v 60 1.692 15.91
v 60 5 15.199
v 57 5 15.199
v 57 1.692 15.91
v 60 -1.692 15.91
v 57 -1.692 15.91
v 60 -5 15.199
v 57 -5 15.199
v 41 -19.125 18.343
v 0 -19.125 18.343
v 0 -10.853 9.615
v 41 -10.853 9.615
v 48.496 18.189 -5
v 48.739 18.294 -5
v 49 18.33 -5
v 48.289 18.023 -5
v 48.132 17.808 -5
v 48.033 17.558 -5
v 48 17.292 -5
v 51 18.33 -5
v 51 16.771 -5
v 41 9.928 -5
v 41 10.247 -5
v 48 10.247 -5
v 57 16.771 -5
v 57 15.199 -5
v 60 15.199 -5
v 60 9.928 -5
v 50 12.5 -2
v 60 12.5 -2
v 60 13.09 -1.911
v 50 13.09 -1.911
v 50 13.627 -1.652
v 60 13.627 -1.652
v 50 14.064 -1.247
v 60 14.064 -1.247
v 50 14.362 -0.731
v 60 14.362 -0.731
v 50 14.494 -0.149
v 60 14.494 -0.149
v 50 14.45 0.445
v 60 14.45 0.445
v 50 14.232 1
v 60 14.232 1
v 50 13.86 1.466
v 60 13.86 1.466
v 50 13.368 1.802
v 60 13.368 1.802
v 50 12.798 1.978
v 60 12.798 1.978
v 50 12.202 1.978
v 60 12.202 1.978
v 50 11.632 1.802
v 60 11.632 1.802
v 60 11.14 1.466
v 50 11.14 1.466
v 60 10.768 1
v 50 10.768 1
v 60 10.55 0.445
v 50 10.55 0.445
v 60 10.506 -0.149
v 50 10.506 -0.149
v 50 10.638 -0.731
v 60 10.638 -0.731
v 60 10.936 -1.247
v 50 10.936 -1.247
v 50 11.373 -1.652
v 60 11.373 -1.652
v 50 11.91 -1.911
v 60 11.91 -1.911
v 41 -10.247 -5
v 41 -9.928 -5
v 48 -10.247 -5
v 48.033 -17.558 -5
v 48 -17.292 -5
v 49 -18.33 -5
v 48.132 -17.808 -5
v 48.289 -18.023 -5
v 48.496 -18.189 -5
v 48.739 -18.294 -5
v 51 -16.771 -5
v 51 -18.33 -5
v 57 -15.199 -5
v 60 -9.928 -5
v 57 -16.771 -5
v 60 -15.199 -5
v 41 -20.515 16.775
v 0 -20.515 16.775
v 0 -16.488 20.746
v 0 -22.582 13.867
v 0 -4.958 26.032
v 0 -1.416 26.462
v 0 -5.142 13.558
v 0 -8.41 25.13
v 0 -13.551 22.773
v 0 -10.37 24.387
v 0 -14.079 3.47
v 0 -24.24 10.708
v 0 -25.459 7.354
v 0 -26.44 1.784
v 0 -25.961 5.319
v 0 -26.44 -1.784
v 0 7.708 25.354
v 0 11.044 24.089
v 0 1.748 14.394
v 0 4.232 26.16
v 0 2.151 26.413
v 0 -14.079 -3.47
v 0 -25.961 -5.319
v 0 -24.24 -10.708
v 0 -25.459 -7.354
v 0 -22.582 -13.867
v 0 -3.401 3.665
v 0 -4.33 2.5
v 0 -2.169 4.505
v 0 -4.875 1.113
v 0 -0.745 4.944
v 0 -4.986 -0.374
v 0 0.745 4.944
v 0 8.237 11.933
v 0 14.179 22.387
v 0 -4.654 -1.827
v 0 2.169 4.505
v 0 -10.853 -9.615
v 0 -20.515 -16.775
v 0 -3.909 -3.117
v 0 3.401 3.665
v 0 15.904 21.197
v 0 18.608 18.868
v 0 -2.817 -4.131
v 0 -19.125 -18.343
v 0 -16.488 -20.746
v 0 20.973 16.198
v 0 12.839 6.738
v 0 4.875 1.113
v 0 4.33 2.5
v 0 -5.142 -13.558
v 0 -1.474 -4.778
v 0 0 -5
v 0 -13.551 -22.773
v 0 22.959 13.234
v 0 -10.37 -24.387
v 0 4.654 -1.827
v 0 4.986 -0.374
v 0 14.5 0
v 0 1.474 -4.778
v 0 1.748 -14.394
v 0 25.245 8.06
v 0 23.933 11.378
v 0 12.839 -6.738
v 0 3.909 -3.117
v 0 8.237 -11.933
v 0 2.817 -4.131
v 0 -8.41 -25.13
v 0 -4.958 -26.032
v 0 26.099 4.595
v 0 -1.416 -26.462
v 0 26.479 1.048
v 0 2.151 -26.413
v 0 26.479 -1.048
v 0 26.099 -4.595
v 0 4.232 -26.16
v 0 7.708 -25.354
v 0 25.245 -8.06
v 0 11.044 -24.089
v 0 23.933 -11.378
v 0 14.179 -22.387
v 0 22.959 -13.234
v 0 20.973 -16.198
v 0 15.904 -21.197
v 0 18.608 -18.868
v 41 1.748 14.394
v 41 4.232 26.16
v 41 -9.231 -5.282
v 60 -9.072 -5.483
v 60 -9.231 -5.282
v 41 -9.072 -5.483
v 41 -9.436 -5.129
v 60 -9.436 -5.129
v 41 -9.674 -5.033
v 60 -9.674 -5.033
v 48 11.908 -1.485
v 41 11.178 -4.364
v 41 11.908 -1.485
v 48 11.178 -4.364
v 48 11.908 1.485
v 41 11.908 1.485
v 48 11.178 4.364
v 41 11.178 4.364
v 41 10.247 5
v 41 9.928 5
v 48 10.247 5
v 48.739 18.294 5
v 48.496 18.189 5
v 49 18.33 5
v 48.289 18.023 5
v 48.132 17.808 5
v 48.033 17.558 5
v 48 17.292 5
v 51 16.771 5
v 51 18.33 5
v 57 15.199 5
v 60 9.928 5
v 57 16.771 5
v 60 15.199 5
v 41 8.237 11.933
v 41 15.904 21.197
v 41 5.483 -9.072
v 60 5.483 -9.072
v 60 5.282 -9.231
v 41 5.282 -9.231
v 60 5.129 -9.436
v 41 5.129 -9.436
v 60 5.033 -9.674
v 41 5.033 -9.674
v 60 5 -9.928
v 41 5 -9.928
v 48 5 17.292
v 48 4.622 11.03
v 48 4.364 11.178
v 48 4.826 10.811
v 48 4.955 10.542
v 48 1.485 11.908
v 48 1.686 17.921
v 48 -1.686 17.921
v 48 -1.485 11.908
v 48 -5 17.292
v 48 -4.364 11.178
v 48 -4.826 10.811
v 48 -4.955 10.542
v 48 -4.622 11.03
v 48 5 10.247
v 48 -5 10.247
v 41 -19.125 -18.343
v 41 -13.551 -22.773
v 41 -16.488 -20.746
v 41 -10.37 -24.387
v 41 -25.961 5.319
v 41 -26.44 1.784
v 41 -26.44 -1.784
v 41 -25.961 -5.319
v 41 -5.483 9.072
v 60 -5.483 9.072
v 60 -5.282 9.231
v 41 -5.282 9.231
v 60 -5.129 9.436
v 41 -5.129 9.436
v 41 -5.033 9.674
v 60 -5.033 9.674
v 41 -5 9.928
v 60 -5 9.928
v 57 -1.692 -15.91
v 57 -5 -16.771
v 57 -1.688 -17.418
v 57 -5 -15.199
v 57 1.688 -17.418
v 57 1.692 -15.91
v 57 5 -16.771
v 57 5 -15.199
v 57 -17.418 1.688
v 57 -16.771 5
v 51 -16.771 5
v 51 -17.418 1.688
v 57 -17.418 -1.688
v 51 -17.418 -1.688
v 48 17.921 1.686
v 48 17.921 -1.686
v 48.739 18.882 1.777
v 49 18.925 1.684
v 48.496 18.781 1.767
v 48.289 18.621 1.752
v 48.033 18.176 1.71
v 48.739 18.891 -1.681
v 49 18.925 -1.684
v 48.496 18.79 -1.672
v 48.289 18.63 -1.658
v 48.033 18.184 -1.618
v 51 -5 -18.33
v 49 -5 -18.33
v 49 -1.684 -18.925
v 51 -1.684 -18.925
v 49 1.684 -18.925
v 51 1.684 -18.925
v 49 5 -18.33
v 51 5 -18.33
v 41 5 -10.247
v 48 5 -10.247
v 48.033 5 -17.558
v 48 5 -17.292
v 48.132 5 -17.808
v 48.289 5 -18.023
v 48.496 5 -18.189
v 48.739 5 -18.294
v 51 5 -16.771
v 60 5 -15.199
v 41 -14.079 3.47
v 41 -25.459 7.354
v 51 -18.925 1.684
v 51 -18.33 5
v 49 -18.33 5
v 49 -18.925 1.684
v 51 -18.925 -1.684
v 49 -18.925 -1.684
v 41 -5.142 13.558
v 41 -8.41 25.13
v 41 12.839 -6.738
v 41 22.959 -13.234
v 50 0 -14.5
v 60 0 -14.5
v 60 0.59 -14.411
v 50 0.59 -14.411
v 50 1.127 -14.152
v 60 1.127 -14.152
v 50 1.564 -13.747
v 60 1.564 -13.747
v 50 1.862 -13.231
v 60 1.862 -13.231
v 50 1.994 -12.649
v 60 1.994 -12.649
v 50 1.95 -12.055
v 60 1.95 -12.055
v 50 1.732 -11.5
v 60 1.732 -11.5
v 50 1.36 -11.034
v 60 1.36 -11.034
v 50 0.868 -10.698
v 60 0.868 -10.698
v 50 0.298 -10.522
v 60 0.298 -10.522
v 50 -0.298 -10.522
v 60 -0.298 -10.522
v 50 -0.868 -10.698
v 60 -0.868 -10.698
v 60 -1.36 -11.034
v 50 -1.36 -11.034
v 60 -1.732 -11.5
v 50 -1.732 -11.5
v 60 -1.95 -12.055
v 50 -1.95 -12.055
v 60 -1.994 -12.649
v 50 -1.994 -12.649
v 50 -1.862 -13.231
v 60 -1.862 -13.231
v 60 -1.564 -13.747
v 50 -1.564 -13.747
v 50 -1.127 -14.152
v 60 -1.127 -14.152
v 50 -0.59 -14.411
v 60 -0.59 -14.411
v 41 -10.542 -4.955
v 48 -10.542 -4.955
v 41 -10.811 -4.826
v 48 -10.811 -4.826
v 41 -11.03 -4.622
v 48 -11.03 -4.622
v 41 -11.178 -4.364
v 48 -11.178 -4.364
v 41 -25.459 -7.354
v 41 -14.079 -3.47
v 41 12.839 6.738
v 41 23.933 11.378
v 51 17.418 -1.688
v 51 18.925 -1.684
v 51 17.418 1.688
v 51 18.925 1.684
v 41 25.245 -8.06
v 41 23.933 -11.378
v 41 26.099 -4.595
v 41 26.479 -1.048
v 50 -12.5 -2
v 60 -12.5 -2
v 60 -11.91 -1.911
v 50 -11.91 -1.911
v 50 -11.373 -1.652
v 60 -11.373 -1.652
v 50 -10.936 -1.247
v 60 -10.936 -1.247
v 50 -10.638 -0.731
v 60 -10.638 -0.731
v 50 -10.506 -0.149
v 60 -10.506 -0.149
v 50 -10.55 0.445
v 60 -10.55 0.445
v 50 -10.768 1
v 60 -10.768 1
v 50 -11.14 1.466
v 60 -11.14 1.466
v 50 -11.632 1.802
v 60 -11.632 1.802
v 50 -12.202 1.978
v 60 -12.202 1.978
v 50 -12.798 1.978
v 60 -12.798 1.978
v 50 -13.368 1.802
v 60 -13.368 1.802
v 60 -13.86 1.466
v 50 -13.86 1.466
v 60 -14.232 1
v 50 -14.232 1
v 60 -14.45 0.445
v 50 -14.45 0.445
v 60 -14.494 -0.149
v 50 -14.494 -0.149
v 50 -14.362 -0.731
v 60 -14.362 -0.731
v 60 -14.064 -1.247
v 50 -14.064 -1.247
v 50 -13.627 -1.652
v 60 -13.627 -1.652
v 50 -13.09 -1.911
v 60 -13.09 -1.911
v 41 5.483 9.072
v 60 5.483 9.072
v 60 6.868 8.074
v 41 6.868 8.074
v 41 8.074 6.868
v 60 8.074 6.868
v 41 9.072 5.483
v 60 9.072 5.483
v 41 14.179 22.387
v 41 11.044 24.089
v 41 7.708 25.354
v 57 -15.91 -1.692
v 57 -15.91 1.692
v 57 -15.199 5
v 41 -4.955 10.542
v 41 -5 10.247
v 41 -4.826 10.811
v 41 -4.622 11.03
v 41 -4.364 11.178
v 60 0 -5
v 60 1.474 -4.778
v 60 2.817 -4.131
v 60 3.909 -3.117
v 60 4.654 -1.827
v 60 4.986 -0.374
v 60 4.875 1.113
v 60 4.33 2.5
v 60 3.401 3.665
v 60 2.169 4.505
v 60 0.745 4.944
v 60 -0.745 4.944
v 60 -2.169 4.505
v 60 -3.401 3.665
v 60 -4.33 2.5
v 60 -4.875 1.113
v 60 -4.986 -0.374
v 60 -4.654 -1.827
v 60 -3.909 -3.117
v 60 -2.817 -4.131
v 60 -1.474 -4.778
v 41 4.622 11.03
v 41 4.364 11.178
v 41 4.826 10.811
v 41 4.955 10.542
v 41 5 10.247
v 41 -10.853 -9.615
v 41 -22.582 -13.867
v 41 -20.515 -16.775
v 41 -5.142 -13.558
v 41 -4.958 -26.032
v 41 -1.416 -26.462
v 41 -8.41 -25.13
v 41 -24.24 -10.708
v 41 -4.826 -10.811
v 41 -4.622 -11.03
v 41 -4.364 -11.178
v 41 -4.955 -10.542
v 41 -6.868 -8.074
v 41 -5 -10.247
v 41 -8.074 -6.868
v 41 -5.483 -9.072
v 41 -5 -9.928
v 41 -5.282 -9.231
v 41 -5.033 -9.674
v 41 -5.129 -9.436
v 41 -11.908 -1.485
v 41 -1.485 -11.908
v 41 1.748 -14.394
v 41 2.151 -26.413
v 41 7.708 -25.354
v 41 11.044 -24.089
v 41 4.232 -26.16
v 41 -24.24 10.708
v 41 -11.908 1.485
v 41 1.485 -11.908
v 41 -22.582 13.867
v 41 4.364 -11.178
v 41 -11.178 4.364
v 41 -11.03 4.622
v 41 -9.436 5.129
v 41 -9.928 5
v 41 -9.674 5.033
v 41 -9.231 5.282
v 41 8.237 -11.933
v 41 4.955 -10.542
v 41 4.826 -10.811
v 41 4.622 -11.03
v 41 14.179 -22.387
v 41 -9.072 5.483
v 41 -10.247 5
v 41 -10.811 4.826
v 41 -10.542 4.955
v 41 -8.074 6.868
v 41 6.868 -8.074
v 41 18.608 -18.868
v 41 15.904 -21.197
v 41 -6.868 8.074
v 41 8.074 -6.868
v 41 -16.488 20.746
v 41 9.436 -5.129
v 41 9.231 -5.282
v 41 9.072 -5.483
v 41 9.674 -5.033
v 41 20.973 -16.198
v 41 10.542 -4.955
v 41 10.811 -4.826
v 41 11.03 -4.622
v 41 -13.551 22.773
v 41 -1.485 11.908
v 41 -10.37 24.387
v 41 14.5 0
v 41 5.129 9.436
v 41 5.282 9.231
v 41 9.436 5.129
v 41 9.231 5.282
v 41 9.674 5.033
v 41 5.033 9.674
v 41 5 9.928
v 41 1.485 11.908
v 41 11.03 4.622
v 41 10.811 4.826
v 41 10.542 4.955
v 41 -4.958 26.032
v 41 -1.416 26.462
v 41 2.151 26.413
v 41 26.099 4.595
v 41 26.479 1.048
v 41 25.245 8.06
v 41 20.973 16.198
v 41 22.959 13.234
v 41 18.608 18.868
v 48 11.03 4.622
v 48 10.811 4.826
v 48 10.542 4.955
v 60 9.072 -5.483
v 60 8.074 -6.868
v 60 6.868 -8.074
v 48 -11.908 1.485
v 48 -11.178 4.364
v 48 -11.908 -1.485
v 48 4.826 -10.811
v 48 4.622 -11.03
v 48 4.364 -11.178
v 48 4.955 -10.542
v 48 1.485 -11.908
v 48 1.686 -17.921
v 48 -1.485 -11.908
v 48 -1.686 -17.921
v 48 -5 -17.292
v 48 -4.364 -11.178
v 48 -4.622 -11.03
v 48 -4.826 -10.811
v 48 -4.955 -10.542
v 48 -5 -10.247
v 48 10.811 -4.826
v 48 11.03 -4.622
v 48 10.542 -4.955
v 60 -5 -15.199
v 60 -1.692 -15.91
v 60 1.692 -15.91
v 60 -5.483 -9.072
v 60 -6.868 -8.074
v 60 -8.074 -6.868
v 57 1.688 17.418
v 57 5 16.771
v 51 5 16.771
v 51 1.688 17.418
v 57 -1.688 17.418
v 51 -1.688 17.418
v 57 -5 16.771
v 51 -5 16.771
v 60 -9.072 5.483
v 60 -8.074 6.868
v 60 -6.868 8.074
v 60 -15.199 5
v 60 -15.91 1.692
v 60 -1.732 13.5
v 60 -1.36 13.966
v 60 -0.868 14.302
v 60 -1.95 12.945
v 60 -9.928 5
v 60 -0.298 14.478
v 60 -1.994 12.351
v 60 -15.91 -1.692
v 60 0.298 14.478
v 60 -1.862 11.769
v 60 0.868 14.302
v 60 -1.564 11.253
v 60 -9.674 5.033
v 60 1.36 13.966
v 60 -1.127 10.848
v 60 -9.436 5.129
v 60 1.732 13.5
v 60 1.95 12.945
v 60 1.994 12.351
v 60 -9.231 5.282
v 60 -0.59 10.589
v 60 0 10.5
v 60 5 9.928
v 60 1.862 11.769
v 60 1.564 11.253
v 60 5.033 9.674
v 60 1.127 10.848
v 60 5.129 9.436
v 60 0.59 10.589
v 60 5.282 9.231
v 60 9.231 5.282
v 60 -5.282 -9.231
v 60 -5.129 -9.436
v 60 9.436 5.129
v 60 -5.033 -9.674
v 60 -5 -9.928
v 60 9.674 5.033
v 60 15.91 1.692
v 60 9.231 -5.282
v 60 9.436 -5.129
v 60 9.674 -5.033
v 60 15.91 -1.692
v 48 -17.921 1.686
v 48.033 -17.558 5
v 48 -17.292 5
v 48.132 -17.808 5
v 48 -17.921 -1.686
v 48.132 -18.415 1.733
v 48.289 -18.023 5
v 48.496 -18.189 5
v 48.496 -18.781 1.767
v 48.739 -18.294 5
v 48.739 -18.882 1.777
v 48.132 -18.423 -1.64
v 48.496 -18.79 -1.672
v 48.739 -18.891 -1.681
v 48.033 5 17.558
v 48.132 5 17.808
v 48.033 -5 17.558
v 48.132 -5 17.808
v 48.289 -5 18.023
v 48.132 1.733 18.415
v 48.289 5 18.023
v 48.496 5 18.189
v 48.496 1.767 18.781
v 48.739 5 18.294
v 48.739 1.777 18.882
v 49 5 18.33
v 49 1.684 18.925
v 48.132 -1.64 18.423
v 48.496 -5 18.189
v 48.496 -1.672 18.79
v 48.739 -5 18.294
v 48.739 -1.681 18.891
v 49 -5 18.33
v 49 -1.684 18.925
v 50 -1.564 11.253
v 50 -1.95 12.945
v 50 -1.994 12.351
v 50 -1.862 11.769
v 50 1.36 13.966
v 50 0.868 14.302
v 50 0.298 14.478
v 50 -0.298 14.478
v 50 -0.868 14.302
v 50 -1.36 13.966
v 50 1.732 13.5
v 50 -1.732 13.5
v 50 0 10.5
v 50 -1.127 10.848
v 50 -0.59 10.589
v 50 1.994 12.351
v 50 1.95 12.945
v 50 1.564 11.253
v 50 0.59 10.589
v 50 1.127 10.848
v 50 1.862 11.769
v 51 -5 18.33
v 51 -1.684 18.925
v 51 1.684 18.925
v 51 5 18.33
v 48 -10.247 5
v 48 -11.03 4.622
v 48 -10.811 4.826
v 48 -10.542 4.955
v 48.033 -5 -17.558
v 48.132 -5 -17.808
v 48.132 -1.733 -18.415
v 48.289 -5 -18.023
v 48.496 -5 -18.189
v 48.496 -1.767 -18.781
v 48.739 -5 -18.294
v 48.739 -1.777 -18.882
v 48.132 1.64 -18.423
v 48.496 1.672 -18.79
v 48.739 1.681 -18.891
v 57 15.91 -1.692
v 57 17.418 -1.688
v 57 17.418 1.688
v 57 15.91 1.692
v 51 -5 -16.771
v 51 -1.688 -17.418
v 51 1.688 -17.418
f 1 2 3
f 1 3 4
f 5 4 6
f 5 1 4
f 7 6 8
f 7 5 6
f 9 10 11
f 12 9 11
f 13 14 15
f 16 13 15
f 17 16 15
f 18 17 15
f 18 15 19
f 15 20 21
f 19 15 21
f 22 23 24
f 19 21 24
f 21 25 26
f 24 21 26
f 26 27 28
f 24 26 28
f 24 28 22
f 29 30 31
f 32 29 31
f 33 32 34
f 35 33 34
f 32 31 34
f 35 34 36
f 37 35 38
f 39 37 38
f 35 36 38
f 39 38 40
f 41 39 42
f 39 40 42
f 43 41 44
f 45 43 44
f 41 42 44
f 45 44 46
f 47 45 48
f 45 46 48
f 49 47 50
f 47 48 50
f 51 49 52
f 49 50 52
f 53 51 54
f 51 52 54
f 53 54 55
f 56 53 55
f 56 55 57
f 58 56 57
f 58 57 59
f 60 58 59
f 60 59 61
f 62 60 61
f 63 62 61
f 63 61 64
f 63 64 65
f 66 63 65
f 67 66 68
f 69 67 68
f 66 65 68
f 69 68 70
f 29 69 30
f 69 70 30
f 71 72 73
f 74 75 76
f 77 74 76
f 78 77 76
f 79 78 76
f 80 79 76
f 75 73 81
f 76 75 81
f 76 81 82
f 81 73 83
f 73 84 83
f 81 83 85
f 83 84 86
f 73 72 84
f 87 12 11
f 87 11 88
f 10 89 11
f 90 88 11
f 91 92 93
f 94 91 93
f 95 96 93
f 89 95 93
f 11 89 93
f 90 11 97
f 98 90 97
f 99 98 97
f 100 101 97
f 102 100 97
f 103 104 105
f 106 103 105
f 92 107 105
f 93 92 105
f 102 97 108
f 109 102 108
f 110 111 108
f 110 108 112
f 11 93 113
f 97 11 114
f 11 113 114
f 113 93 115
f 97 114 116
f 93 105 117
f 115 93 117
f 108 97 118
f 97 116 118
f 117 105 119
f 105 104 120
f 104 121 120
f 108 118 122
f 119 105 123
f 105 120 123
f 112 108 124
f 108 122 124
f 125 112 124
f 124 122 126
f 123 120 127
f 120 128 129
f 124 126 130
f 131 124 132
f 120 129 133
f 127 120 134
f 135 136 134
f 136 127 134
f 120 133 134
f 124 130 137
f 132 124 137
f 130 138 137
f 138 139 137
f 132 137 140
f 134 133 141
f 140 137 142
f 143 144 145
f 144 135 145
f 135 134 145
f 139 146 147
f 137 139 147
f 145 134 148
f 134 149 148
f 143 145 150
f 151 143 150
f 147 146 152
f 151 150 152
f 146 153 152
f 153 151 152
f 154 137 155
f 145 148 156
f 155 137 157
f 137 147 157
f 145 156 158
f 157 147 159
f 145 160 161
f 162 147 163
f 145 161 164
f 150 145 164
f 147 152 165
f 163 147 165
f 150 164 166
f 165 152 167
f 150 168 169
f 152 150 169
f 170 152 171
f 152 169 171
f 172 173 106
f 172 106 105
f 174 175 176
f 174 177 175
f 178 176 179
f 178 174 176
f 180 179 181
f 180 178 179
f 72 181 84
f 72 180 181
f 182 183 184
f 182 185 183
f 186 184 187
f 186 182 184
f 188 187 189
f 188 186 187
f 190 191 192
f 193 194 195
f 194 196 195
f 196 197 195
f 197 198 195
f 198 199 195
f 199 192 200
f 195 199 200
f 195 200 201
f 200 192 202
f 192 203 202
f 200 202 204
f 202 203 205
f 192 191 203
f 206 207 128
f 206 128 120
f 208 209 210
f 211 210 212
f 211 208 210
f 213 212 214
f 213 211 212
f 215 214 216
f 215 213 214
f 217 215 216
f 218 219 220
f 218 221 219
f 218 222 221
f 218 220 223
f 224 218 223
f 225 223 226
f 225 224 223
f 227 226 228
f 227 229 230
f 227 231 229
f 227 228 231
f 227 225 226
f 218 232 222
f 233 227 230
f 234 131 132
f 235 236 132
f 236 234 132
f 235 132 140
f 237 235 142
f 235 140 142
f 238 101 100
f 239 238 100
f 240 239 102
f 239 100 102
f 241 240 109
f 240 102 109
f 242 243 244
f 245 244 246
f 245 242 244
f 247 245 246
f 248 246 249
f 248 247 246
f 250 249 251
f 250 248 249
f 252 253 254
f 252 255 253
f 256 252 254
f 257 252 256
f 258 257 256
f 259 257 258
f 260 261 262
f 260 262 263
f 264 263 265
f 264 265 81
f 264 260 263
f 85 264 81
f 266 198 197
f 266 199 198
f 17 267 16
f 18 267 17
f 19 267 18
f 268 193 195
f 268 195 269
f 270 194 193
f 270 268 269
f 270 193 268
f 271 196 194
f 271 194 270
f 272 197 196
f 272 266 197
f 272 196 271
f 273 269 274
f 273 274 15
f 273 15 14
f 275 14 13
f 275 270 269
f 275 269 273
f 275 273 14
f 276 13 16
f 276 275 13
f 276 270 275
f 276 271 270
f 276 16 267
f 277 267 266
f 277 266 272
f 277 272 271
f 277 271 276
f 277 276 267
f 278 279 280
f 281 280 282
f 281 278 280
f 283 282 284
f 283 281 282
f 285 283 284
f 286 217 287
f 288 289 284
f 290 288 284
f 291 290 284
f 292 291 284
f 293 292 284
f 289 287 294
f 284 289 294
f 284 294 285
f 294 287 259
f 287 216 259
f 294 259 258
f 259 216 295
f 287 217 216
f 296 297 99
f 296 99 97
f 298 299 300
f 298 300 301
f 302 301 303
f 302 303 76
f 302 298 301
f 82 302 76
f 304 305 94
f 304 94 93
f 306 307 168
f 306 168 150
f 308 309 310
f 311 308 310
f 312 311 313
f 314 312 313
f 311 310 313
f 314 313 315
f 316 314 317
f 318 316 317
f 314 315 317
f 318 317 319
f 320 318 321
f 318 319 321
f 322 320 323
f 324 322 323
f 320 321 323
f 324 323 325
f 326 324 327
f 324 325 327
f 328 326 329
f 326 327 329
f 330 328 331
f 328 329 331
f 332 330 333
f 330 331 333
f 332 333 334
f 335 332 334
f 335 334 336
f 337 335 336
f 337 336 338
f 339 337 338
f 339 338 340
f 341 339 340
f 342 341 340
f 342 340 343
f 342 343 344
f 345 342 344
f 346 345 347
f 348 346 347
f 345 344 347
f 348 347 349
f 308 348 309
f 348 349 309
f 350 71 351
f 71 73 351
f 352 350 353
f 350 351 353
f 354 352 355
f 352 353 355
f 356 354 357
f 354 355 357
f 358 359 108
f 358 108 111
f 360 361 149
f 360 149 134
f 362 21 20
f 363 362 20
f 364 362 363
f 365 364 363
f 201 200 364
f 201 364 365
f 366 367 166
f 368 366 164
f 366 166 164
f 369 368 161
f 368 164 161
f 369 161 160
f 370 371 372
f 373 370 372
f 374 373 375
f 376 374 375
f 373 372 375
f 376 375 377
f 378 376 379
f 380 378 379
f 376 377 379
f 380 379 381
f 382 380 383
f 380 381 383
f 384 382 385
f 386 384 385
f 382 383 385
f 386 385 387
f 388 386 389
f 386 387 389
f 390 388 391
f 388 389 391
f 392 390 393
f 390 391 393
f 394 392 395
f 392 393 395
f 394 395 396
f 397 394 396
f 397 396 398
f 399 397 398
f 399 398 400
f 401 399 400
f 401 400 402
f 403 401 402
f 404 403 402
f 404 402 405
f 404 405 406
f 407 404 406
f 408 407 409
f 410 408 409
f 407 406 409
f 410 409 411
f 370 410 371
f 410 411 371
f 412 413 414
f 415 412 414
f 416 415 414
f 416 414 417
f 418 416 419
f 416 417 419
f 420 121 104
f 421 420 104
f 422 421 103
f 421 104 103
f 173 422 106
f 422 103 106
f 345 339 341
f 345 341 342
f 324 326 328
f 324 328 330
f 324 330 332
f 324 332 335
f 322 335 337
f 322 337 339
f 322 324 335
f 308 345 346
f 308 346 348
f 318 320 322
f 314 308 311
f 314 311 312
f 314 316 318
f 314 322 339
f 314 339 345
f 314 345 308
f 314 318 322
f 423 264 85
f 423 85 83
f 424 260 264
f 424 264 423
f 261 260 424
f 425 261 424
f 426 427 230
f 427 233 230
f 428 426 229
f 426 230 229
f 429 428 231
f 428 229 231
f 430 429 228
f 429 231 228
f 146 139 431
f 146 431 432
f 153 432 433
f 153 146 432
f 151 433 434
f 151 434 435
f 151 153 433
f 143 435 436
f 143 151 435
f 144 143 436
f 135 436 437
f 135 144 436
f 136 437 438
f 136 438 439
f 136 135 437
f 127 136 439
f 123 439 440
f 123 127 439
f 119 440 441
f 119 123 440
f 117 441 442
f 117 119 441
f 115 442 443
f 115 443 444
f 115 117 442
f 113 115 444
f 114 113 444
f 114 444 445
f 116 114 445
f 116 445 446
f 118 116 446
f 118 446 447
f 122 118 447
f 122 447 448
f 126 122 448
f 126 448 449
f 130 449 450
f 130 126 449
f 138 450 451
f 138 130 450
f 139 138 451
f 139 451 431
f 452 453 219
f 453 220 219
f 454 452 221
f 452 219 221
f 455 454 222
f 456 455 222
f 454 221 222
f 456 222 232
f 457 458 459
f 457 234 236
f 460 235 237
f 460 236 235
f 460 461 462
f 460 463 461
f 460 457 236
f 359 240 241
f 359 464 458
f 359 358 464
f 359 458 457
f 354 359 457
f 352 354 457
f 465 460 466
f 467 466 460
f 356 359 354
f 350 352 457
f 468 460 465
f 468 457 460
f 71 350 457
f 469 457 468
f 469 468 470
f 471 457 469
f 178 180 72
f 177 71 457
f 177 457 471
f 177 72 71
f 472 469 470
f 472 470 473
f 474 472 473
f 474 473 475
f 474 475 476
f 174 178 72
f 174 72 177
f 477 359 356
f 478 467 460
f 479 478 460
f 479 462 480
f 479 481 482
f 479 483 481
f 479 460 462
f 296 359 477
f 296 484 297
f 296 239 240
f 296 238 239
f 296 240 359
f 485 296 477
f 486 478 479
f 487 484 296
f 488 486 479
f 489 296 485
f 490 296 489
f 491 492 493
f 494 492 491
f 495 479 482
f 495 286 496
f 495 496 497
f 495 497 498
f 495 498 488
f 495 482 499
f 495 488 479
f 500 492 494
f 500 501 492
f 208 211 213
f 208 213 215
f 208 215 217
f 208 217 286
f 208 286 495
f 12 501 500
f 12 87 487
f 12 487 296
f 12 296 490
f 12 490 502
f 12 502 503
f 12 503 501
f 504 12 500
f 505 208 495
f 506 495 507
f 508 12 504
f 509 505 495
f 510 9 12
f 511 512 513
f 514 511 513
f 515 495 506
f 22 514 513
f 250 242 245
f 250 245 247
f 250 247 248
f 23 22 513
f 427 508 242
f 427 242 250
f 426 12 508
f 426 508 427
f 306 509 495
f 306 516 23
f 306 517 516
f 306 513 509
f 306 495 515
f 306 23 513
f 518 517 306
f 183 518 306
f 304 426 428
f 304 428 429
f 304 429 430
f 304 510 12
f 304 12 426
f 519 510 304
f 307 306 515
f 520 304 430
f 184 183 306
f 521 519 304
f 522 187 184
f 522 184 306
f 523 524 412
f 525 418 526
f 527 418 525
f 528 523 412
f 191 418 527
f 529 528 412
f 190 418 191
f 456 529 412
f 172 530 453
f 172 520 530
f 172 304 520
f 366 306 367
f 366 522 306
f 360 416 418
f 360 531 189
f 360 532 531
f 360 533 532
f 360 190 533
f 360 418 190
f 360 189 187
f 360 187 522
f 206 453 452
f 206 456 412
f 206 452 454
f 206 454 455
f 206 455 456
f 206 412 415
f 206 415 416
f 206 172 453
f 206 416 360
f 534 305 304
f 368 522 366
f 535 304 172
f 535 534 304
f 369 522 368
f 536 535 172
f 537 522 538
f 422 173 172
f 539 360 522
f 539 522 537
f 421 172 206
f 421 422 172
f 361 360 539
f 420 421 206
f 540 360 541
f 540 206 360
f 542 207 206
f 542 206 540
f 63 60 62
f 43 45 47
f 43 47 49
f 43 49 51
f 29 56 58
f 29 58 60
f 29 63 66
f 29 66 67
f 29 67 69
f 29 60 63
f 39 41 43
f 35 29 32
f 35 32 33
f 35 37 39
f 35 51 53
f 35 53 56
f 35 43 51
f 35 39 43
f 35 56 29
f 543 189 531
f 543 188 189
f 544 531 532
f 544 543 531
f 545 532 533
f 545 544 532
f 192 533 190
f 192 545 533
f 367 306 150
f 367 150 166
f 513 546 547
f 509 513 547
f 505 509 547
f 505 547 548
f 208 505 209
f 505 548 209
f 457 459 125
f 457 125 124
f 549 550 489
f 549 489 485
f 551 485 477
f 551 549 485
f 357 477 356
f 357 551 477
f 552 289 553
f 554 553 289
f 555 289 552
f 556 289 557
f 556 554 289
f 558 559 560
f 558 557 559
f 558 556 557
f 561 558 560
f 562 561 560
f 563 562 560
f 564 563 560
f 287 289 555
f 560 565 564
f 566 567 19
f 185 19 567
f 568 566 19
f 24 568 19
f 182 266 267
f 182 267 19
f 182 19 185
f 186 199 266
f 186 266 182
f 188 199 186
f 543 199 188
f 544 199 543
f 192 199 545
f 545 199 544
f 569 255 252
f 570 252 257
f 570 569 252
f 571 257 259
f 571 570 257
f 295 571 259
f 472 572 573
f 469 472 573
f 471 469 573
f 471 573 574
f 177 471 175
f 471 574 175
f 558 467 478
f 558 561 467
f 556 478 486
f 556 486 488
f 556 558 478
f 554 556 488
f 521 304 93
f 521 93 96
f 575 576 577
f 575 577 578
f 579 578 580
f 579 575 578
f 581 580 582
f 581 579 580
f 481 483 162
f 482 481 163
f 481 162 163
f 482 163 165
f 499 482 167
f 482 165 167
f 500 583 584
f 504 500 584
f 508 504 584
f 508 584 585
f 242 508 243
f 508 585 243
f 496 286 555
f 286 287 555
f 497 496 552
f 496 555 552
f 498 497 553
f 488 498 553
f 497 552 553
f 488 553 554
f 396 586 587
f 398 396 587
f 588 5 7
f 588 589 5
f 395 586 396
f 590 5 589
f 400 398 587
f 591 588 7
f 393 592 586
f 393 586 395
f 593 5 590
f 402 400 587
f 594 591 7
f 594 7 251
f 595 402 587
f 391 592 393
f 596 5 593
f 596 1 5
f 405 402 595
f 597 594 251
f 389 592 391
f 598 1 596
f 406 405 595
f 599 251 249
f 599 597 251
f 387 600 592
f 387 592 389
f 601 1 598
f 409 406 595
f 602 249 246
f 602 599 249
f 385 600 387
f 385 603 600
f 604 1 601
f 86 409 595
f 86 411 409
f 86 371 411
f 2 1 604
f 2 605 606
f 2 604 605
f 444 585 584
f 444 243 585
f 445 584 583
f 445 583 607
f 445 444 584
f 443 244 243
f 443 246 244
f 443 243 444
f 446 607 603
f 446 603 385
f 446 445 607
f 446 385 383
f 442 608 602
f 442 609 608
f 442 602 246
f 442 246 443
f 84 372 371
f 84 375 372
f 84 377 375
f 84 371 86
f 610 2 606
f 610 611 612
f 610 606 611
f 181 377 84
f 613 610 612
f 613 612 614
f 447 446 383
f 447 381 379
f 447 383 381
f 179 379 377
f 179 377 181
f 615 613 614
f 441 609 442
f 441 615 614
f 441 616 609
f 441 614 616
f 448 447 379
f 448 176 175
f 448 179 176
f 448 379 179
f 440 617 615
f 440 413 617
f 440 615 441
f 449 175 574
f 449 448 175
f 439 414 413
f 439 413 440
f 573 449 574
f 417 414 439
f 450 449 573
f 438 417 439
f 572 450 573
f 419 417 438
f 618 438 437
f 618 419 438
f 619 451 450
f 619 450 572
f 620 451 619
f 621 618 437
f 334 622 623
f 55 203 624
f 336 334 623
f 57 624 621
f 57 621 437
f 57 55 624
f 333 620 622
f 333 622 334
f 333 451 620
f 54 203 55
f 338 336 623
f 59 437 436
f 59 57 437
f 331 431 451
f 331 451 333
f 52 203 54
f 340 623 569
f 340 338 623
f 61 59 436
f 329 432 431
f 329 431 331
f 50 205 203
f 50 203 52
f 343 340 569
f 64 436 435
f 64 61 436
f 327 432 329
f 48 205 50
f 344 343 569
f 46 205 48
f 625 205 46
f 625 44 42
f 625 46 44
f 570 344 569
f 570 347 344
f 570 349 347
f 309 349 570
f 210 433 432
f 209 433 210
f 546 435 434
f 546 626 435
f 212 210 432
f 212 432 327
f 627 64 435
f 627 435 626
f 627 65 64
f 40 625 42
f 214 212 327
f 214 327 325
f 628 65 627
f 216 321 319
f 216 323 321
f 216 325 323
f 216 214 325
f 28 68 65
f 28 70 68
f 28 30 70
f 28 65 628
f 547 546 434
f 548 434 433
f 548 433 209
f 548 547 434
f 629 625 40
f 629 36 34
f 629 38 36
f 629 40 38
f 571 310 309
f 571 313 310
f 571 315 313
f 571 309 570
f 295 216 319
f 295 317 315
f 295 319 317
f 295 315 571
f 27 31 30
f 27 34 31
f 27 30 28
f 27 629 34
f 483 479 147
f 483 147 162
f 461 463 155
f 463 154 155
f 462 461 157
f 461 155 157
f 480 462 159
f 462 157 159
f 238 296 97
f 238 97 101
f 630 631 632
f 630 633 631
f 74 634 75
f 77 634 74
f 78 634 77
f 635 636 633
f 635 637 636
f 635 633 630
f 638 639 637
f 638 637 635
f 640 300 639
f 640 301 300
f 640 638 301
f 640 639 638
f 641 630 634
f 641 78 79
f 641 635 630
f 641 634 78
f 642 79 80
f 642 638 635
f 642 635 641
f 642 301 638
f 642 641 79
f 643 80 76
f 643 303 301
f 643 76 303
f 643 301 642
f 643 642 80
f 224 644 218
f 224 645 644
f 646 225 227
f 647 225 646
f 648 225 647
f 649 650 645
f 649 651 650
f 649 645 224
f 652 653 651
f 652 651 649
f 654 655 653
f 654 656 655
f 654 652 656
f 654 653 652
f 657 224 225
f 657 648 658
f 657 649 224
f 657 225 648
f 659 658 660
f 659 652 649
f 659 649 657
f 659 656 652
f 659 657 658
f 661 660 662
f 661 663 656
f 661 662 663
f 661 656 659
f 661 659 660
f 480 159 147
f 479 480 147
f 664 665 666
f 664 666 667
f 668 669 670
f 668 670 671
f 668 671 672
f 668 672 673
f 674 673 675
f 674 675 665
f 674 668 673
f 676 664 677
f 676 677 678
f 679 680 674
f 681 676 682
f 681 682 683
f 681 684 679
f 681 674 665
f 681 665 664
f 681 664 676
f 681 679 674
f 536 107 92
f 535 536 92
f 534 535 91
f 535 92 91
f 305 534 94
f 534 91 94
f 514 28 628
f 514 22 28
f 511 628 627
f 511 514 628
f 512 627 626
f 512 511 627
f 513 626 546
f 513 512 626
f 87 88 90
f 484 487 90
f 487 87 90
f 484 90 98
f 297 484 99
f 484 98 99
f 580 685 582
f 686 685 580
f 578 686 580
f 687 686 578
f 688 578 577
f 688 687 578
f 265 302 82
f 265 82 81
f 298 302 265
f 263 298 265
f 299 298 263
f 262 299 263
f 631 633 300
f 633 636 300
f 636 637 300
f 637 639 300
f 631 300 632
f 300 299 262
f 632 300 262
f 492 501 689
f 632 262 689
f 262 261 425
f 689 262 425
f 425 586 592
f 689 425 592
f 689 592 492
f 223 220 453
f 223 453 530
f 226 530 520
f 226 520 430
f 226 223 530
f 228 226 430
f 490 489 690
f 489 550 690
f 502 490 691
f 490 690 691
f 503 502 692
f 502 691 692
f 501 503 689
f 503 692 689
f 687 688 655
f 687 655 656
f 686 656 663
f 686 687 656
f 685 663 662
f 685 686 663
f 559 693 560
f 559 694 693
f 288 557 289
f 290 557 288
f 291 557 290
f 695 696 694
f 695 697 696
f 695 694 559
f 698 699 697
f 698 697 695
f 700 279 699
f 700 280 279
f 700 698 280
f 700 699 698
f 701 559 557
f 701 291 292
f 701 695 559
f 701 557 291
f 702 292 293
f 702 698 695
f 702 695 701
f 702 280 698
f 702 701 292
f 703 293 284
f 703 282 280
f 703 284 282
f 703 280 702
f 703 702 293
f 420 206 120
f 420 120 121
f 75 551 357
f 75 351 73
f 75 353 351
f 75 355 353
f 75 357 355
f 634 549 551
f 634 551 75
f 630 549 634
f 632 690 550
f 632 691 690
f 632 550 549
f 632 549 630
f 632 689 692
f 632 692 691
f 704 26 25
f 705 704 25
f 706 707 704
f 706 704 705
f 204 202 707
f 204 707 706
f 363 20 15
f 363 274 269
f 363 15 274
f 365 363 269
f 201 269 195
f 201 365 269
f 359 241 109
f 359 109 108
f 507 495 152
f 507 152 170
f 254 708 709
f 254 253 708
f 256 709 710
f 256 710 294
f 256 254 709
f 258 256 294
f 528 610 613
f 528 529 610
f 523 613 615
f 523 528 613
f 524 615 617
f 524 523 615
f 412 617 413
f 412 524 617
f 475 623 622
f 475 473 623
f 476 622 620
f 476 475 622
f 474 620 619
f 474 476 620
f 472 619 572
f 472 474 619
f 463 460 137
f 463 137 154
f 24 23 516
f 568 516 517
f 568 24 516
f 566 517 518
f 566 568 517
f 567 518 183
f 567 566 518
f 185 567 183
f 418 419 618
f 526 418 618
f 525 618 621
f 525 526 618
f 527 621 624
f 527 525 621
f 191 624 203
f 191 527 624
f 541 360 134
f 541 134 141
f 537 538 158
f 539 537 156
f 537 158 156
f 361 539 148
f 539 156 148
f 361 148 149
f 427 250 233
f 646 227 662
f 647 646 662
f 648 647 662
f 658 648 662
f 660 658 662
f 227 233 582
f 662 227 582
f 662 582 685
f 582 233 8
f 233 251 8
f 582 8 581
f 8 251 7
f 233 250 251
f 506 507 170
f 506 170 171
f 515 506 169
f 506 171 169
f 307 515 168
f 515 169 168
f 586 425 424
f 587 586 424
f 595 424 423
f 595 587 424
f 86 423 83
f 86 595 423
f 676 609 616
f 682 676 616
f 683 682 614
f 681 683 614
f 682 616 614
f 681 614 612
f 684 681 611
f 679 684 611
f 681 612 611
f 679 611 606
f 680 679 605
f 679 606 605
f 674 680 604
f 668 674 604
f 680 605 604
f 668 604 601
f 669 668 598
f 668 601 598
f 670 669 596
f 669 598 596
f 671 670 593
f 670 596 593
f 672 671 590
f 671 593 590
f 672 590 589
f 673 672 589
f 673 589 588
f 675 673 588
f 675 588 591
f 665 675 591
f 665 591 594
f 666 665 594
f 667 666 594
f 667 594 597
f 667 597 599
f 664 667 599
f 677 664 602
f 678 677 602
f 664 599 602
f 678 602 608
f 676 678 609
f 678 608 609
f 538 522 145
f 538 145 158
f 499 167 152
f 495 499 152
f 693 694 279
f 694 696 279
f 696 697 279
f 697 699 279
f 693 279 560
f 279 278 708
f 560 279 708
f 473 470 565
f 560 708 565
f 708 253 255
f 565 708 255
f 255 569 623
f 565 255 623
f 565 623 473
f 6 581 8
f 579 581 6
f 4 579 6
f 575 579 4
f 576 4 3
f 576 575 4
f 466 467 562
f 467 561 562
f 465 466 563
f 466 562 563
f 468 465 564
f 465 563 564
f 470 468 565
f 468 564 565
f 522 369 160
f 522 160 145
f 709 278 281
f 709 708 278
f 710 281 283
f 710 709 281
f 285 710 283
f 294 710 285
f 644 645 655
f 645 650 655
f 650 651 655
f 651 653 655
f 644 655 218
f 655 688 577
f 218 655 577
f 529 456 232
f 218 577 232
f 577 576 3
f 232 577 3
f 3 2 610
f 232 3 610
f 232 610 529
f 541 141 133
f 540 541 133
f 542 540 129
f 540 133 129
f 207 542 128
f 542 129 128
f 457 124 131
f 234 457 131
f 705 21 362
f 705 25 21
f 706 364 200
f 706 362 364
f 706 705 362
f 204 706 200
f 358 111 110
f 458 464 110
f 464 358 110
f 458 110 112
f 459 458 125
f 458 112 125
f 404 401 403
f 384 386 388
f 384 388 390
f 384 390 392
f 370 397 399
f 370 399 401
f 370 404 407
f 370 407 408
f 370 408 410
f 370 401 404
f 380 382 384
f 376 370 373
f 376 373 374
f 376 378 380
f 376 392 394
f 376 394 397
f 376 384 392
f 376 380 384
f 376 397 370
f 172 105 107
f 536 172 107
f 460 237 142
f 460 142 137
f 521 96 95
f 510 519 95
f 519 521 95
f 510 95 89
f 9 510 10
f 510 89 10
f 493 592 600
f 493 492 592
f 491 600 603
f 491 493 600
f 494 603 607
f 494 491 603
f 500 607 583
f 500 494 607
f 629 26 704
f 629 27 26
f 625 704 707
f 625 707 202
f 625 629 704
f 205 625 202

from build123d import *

# Parameters (mm, degrees)
SKETCH1_R      = 26.5
SKETCH1_R_2    = 5
EXTRUDE1_DEPTH = 60
SKETCH3_R      = 2
EXTRUDE2_DEPTH = 10
EXTRUDE3_START = -41
EXTRUDE3_DEPTH = 41
EXTRUDE4_DEPTH = 19
FILLET1_R      = 1


with BuildPart() as part:
    # Sketch1 → Extrude1 (new body)
    with BuildSketch(Plane(origin=(0, 0, 0), x_dir=(0, 0, -1), z_dir=(1, 0, 0))):
        Circle(SKETCH1_R)
        Circle(SKETCH1_R_2, mode=Mode.SUBTRACT)
    extrude(amount=EXTRUDE1_DEPTH)

    # Sketch2 → Cut-Revolve1 (revolve, cut)
    with BuildSketch(Plane.XY):
        Polygon((60, 16), (60, 26.5), (41, 26.5), (41, 12), (48, 12), (48, 19), (51, 19), (51, 17.5), (57, 17.5), (57, 16), align=None)
    revolve(axis=Axis((0, 0, 0), (1, 0, 0)), mode=Mode.SUBTRACT)

    # Sketch3 → Extrude2 (cut)
    with BuildSketch(Plane(origin=(60, 0, 0), x_dir=(0, 0, -1), z_dir=(1, 0, 0))):
        with Locations((0, 12.5)):
            Circle(SKETCH3_R)
        with Locations((12.5, 0)):
            Circle(SKETCH3_R)
        with Locations((0, -12.5)):
            Circle(SKETCH3_R)
        with Locations((-12.5, 0)):
            Circle(SKETCH3_R)
    extrude(amount=-EXTRUDE2_DEPTH, mode=Mode.SUBTRACT)

    # Sketch4 → Extrude3 (cut)
    with BuildSketch(Plane.ZY.offset(EXTRUDE3_START)):
        with BuildLine():
            Line((0, 14.5), (1.048050077, 26.479267192))
            ThreePointArc((1.048050077, 26.479267192), (0, 26.5), (-1.048050077, 26.479267192))
            Line((-1.048050077, 26.479267192), (0, 14.5))
        make_face()
        with BuildLine():
            Line((11.377526787, 23.933279846), (6.738485995, 12.839112372))
            Line((6.738485995, 12.839112372), (13.233531299, 22.959173534))
            ThreePointArc((13.233531299, 22.959173534), (12.315164059, 23.46458468), (11.377526787, 23.933279846))
        make_face()
        with BuildLine():
            Line((-6.738485995, 12.839112372), (-11.377526787, 23.933279846))
            ThreePointArc((-11.377526787, 23.933279846), (-12.315164059, 23.46458468), (-13.233531299, 22.959173534))
            Line((-13.233531299, 22.959173534), (-6.738485995, 12.839112372))
        make_face()
        with BuildLine():
            Line((21.196649379, 15.904466515), (11.933266055, 8.236938828))
            Line((11.933266055, 8.236938828), (22.387369981, 14.179409907))
            ThreePointArc((22.387369981, 14.179409907), (21.809072446, 15.053715788), (21.196649379, 15.904466515))
        make_face()
        with BuildLine():
            Line((-11.933266055, 8.236938828), (-21.196649379, 15.904466515))
            ThreePointArc((-21.196649379, 15.904466515), (-21.809072446, 15.053715788), (-22.387369981, 14.179409907))
            Line((-22.387369981, 14.179409907), (-11.933266055, 8.236938828))
        make_face()
        with BuildLine():
            Line((26.159875044, 4.232131575), (14.394278674, 1.747781864))
            Line((14.394278674, 1.747781864), (26.412531998, 2.151314351))
            ThreePointArc((26.412531998, 2.151314351), (26.306785164, 3.194222027), (26.159875044, 4.232131575))
        make_face()
        with BuildLine():
            Line((-14.394278674, 1.747781864), (-26.159875044, 4.232131575))
            ThreePointArc((-26.159875044, 4.232131575), (-26.306785164, 3.194222027), (-26.412531998, 2.151314351))
            Line((-26.412531998, 2.151314351), (-14.394278674, 1.747781864))
        make_face()
        with BuildLine():
            Line((25.130188598, -8.409733707), (13.557735519, -5.141770862))
            Line((13.557735519, -5.141770862), (24.38690124, -10.369621396))
            ThreePointArc((24.38690124, -10.369621396), (24.777930431, -9.397029507), (25.130188598, -8.409733707))
        make_face()
        with BuildLine():
            Line((-13.557735519, -5.141770862), (-25.130188598, -8.409733707))
            ThreePointArc((-25.130188598, -8.409733707), (-24.777930431, -9.397029507), (-24.38690124, -10.369621396))
            Line((-24.38690124, -10.369621396), (-13.557735519, -5.141770862))
        make_face()
        with BuildLine():
            Line((18.343478796, -19.125030344), (9.615278544, -10.853405848))
            Line((9.615278544, -10.853405848), (16.774525302, -20.51500185))
            ThreePointArc((16.774525302, -20.51500185), (17.572750443, -19.835534827), (18.343478796, -19.125030344))
        make_face()
        with BuildLine():
            Line((-9.615278544, -10.853405848), (-18.343478796, -19.125030344))
            ThreePointArc((-18.343478796, -19.125030344), (-17.572750443, -19.835534827), (-16.774525302, -20.51500185))
            Line((-16.774525302, -20.51500185), (-9.615278544, -10.853405848))
        make_face()
        with BuildLine():
            Line((7.354499064, -25.459013011), (3.470077132, -14.078656353))
            Line((3.470077132, -14.078656353), (5.319307772, -25.960642612))
            ThreePointArc((5.319307772, -25.960642612), (6.341865104, -25.729958162), (7.354499064, -25.459013011))
        make_face()
        with BuildLine():
            Line((-3.470077132, -14.078656353), (-7.354499064, -25.459013011))
            ThreePointArc((-7.354499064, -25.459013011), (-6.341865104, -25.729958162), (-5.319307772, -25.960642612))
            Line((-5.319307772, -25.960642612), (-3.470077132, -14.078656353))
        make_face()
    extrude(amount=EXTRUDE3_DEPTH, mode=Mode.SUBTRACT)

    # Sketch5 → Extrude4 (cut)
    with BuildSketch(Plane(origin=(60, 0, 0), x_dir=(0, 0, -1), z_dir=(1, 0, 0))):
        with BuildLine():
            Line((-5, 9.346657156), (-5, 15.198684154))
            ThreePointArc((-5, 15.198684154), (-11.313708499, 11.313708499), (-15.198684154, 5))
            Line((-15.198684154, 5), (-9.346657156, 5))
            ThreePointArc((-9.346657156, 5), (-7.495331881, 7.495331881), (-5, 9.346657156))
        make_face()
        with BuildLine():
            Line((-5, 15.198684154), (-5, 18.33030278))
            ThreePointArc((-5, 18.33030278), (-13.435028843, 13.435028843), (-18.33030278, 5))
            Line((-18.33030278, 5), (-15.198684154, 5))
            ThreePointArc((-15.198684154, 5), (-11.313708499, 11.313708499), (-5, 15.198684154))
        make_face()
        with BuildLine():
            ThreePointArc((15.198684154, 5), (11.313708499, 11.313708499), (5, 15.198684154))
            Line((5, 15.198684154), (5, 9.346657156))
            ThreePointArc((5, 9.346657156), (7.495331881, 7.495331881), (9.346657156, 5))
            Line((9.346657156, 5), (15.198684154, 5))
        make_face()
        with BuildLine():
            ThreePointArc((18.33030278, 5), (13.435028843, 13.435028843), (5, 18.33030278))
            Line((5, 18.33030278), (5, 15.198684154))
            ThreePointArc((5, 15.198684154), (11.313708499, 11.313708499), (15.198684154, 5))
            Line((15.198684154, 5), (18.33030278, 5))
        make_face()
        with BuildLine():
            ThreePointArc((5, -15.198684154), (11.313708499, -11.313708499), (15.198684154, -5))
            Line((15.198684154, -5), (9.346657156, -5))
            ThreePointArc((9.346657156, -5), (7.495331881, -7.495331881), (5, -9.346657156))
            Line((5, -9.346657156), (5, -15.198684154))
        make_face()
        with BuildLine():
            ThreePointArc((5, -18.33030278), (13.435028843, -13.435028843), (18.33030278, -5))
            Line((18.33030278, -5), (15.198684154, -5))
            ThreePointArc((15.198684154, -5), (11.313708499, -11.313708499), (5, -15.198684154))
            Line((5, -15.198684154), (5, -18.33030278))
        make_face()
        with BuildLine():
            Line((-9.346657156, -5), (-15.198684154, -5))
            ThreePointArc((-15.198684154, -5), (-11.313708499, -11.313708499), (-5, -15.198684154))
            Line((-5, -15.198684154), (-5, -9.346657156))
            ThreePointArc((-5, -9.346657156), (-7.495331881, -7.495331881), (-9.346657156, -5))
        make_face()
        with BuildLine():
            Line((-15.198684154, -5), (-18.33030278, -5))
            ThreePointArc((-18.33030278, -5), (-13.435028843, -13.435028843), (-5, -18.33030278))
            Line((-5, -18.33030278), (-5, -15.198684154))
            ThreePointArc((-5, -15.198684154), (-11.313708499, -11.313708499), (-15.198684154, -5))
        make_face()
    extrude(amount=-EXTRUDE4_DEPTH, mode=Mode.SUBTRACT)

    # Fillet1
    fillet1_edges = [part.edges().sort_by_distance(p)[0] for p in [
        (48, 19, 0),
        (44.5, 10.908712115, 5),
        (50.5, 5, 9.346657156),
        (44.5, 5, 10.908712115),
        (50.5, 9.346657156, 5),
        (48, 0, -19),
        (44.5, 5, -10.908712115),
        (50.5, 9.346657156, -5),
        (44.5, 10.908712115, -5),
        (50.5, 5, -9.346657156),
        (48, -19, 0),
        (44.5, -10.908712115, -5),
        (50.5, -5, -9.346657156),
        (44.5, -5, -10.908712115),
        (50.5, -9.346657156, -5),
        (48, 0, 19),
        (44.5, -5, 10.908712115),
        (50.5, -9.346657156, 5),
        (44.5, -10.908712115, 5),
        (50.5, -5, 9.346657156),
    ]]
    fillet(fillet1_edges, radius=FILLET1_R)


solid = part.part
